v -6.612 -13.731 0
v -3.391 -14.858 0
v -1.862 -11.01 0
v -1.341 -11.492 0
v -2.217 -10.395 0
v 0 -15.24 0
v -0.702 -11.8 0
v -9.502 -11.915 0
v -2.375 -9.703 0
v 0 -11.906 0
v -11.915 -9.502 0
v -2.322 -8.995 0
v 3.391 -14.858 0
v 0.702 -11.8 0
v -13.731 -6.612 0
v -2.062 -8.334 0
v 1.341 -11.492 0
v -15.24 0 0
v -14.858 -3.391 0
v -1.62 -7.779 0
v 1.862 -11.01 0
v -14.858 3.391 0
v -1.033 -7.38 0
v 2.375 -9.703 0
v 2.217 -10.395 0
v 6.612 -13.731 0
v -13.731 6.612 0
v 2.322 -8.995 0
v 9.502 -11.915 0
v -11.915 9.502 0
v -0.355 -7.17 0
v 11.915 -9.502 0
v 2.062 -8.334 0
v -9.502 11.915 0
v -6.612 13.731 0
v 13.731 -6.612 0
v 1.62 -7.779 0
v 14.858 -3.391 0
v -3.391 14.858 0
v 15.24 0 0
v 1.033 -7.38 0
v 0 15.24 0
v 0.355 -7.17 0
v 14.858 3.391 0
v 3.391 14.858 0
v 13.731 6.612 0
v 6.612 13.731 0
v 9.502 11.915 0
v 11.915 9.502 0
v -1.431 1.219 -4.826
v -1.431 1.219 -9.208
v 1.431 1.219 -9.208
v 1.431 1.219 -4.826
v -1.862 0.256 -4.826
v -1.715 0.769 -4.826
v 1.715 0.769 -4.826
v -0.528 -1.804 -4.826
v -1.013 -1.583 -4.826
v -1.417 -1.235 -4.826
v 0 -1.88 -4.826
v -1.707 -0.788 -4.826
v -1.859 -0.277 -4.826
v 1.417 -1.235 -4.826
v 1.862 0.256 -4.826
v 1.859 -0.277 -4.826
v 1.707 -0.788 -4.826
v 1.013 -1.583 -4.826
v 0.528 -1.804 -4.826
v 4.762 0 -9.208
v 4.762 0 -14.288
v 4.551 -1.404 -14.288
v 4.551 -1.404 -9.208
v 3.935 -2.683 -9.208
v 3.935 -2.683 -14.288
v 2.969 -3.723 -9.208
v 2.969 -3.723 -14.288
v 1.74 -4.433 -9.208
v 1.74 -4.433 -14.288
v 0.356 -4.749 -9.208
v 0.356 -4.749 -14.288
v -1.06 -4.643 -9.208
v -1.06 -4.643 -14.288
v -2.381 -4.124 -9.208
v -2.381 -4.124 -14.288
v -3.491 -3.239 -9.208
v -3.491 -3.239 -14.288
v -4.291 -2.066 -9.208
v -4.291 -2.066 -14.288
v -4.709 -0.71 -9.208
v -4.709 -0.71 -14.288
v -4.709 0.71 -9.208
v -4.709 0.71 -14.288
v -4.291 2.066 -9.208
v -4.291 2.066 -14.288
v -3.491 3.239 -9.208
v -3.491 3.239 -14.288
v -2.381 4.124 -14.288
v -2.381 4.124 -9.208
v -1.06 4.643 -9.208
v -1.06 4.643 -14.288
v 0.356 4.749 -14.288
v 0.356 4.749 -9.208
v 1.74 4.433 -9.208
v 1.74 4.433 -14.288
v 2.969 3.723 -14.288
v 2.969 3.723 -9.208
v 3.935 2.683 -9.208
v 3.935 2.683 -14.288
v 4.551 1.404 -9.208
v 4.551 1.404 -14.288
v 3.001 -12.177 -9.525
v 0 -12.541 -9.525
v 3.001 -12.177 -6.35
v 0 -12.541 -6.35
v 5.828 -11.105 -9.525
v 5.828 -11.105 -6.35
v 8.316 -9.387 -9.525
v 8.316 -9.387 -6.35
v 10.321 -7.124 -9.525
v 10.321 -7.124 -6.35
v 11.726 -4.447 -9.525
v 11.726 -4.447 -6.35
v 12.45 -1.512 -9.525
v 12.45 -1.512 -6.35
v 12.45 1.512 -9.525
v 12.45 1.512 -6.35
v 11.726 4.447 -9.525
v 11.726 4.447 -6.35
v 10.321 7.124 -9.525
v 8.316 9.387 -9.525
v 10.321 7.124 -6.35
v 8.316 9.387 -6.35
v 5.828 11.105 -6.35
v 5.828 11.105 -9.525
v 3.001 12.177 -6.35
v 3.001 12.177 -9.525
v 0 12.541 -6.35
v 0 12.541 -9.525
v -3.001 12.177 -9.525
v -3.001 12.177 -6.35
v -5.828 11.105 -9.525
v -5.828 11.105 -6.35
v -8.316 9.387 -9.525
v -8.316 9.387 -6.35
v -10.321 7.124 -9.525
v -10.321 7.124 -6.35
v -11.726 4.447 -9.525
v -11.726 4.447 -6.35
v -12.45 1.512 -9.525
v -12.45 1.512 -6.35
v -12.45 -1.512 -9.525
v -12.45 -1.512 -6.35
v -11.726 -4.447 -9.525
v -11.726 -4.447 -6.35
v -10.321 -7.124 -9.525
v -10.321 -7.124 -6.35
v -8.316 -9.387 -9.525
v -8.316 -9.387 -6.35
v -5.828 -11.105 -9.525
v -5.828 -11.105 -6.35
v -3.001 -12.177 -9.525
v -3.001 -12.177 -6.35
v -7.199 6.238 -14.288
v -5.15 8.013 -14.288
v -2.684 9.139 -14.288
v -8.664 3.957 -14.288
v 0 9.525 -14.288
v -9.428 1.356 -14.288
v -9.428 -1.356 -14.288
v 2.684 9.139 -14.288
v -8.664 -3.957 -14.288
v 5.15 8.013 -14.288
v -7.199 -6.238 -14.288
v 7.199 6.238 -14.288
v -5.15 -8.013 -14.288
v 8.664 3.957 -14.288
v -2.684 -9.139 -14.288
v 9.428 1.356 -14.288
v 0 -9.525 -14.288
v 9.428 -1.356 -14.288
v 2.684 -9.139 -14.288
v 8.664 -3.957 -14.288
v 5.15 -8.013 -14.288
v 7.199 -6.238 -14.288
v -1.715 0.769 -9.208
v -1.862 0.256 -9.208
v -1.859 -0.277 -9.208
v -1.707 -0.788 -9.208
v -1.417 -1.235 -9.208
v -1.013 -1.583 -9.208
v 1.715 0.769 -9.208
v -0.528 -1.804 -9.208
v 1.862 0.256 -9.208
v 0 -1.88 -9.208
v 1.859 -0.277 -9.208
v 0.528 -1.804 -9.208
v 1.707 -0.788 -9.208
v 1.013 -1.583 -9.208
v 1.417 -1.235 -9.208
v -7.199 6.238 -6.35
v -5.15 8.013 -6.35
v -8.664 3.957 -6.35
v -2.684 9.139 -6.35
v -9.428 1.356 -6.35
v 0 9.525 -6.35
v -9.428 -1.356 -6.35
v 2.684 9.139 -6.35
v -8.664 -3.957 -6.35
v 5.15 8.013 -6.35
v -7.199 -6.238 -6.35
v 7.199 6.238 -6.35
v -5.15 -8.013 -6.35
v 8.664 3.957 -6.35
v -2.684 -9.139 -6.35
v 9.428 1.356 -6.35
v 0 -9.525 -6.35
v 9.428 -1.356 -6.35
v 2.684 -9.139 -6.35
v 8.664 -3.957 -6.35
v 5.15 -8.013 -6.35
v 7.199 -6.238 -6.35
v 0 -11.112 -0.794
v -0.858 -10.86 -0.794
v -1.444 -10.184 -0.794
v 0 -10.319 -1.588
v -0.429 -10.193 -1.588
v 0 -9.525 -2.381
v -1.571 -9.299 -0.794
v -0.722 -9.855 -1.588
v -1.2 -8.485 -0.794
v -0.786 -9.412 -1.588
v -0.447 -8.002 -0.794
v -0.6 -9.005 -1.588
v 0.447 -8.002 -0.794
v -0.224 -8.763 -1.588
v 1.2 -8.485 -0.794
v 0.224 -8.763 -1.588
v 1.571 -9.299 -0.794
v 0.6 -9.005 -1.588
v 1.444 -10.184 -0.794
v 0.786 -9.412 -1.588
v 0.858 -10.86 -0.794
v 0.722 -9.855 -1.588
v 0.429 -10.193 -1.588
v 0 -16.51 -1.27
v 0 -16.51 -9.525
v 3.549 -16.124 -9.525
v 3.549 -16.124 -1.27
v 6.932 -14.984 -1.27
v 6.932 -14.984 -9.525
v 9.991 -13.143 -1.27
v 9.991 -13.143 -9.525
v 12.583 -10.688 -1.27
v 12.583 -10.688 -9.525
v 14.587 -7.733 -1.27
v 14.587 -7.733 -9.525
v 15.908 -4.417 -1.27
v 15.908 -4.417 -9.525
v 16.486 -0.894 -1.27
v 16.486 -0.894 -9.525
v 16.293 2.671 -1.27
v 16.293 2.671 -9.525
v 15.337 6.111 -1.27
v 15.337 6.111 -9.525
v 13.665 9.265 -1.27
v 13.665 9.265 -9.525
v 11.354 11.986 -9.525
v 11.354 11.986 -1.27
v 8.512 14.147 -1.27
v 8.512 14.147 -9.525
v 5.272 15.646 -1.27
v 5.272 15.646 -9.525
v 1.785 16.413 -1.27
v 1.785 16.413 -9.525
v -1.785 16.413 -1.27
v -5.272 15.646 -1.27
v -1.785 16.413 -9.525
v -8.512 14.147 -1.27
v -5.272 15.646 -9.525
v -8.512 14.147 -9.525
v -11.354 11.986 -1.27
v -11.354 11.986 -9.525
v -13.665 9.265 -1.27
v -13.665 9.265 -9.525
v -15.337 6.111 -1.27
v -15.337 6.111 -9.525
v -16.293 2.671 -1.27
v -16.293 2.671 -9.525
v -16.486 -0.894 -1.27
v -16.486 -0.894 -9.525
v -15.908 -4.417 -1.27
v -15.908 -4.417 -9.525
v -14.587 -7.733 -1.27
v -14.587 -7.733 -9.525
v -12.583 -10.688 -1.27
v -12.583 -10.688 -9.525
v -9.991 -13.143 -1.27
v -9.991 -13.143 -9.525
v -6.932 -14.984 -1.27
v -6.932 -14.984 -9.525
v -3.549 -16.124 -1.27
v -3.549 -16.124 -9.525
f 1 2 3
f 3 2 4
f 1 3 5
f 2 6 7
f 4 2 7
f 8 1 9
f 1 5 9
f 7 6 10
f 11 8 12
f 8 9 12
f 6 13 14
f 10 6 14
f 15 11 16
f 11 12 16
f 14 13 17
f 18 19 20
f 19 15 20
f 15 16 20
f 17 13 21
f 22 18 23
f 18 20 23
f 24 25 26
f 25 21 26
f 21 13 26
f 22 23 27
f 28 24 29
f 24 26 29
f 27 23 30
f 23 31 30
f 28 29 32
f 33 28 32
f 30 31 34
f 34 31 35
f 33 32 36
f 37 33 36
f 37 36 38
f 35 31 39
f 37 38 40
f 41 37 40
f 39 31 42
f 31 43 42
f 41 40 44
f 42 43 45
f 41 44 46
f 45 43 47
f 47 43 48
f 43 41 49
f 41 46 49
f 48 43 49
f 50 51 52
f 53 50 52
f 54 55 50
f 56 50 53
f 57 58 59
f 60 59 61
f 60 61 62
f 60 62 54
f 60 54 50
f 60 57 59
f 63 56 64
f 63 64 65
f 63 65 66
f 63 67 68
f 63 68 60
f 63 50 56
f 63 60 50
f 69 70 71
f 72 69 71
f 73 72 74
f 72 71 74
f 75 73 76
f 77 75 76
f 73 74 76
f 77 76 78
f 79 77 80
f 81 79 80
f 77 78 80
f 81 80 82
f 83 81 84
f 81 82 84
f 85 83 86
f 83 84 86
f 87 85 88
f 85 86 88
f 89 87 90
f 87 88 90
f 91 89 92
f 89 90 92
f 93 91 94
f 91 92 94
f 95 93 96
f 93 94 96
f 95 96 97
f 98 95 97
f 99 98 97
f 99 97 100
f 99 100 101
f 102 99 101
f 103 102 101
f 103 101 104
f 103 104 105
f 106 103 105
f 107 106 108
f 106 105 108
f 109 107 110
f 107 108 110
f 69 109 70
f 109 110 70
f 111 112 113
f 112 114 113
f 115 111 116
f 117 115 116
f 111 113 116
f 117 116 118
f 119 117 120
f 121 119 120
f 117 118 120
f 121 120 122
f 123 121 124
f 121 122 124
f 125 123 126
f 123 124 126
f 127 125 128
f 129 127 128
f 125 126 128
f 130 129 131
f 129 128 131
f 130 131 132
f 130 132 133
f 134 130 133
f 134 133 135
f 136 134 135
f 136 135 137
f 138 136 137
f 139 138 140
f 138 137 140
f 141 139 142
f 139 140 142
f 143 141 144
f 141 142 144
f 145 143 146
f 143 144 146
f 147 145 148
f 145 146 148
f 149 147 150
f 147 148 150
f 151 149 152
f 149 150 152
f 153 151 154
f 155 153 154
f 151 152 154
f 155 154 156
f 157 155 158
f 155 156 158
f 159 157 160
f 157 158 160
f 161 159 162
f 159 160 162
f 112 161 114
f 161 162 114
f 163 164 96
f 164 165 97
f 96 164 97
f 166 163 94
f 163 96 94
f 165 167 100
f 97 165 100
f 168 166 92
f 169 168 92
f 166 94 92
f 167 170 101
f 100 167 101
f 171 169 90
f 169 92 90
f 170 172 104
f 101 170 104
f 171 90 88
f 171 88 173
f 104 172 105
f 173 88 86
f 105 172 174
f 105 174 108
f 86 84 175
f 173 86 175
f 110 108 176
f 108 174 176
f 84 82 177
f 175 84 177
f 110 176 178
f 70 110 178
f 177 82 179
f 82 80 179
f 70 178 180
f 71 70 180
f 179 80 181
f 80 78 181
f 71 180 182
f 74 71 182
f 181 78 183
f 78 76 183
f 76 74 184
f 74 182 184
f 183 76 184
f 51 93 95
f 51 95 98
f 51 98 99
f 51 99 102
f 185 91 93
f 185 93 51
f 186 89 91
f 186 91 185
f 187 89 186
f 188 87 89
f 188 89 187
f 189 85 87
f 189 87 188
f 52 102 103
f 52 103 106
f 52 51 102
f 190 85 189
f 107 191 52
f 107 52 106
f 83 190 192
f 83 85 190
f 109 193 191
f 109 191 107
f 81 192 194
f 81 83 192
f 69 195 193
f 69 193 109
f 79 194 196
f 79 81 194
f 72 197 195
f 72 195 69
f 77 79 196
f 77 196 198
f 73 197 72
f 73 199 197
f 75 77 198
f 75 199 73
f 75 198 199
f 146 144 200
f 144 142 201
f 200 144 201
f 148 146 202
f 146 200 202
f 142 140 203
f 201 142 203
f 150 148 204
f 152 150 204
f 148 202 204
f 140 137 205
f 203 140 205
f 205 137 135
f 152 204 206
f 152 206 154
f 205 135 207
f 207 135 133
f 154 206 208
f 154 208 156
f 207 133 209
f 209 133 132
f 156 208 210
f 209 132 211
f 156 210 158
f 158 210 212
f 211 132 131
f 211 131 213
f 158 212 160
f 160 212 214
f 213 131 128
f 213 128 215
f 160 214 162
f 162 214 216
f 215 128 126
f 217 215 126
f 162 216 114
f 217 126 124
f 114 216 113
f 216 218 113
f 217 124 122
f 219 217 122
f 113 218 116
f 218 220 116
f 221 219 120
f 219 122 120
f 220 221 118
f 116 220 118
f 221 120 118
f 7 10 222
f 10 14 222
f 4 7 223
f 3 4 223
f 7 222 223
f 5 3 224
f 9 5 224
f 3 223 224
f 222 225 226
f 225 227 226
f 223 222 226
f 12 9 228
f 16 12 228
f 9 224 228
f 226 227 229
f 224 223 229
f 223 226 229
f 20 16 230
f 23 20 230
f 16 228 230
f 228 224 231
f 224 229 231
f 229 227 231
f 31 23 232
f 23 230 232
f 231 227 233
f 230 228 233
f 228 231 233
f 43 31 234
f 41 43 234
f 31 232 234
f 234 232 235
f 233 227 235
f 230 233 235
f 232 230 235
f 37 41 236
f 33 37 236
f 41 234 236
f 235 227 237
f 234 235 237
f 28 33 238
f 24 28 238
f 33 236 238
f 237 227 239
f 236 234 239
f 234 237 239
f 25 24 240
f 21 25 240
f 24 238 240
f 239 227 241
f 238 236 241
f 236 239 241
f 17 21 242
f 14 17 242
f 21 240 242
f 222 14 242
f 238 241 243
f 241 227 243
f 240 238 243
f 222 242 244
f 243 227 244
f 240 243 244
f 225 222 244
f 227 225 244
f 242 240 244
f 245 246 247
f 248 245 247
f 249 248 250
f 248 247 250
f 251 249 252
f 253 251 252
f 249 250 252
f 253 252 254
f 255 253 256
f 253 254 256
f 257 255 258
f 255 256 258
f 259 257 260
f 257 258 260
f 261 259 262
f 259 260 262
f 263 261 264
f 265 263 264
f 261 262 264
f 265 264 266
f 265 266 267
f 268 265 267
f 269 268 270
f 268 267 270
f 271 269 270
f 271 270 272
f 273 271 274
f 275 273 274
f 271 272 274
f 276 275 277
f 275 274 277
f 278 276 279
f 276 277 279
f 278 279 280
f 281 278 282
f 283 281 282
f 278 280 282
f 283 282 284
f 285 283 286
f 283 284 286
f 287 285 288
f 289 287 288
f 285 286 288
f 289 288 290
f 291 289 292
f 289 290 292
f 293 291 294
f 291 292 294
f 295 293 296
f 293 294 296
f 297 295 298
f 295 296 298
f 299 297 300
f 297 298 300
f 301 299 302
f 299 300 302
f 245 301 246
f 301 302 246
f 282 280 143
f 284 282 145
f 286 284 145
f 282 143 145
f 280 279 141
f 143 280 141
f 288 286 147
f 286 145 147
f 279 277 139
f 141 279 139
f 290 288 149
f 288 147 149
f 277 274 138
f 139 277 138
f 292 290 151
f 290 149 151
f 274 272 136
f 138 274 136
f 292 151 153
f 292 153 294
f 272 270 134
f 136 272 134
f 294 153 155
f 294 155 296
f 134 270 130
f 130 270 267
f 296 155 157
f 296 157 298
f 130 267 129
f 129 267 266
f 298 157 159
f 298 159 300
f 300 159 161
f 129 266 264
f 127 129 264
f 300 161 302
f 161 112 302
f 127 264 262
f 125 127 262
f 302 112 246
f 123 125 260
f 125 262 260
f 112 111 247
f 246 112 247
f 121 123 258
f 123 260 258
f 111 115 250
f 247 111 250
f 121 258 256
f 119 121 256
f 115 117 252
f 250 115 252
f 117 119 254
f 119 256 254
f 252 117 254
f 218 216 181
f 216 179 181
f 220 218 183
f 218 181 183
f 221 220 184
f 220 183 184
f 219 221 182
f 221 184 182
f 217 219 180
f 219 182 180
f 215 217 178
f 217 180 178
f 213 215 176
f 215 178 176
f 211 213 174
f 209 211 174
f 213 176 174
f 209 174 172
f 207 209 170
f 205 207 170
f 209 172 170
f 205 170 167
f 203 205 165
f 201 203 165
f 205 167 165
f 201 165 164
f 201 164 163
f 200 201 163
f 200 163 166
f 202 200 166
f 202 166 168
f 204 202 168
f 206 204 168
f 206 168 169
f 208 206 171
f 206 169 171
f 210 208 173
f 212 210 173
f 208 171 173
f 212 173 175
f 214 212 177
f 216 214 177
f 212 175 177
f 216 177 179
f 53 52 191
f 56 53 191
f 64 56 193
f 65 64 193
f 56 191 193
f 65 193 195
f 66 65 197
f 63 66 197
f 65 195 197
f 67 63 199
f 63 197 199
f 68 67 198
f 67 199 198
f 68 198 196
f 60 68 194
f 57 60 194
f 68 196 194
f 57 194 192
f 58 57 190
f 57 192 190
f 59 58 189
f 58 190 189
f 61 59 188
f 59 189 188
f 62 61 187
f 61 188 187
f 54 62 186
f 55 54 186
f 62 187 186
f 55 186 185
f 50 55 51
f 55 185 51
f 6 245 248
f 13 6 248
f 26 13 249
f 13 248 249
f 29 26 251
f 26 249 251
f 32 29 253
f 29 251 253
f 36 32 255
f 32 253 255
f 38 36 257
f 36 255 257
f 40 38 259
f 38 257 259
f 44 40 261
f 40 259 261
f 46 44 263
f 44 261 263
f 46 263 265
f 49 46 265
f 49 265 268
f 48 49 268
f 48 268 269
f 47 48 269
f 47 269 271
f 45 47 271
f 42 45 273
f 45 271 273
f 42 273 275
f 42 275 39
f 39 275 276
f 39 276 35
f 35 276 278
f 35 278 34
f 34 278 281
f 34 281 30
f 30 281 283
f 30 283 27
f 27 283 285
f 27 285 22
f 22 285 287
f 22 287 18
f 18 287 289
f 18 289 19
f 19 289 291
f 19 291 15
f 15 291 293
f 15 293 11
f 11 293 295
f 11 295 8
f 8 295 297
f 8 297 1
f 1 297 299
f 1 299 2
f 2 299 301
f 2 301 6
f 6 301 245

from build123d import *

# Parameters (mm, degrees)
F3_DEPTH  = 9.4615
F6_SIZE   = 1.27
F7_R      = 4.7625
F8_DEPTH  = 5.08
F10_DEPTH = 4.3815


with BuildPart() as f1:
    # F0 (on Right) → F1 (revolve)
    with BuildSketch(Plane.YZ):
        Polygon((0, -14.2875), (0, 0), (-16.51, 0), (-16.51, -9.525), (-12.54125, -9.525), (-12.54125, -6.35), (-9.525, -6.35), (-9.525, -14.2875), align=None)
    revolve(axis=Axis((0, 0, -7.14375), (0, 0, 1)))

    # F2 (on face) → F3 (cut)
    with BuildSketch(Plane(origin=(0, 0, -14.2875), x_dir=(1, 0, 0), z_dir=(0, 0, -1))):
        with BuildLine():
            Line((-1.39492, -1.143), (1.39492, -1.143))
            ThreePointArc((1.39492, -1.143), (0, 1.8034), (-1.39492, -1.143))
        make_face()
    extrude(amount=-F3_DEPTH, mode=Mode.SUBTRACT)

    # F4 (on Right) → F5 (revolve, cut)
    with BuildSketch(Plane.YZ):
        Polygon((-9.525, 0), (-11.90625, 0), (-9.525, -2.38125), align=None)
    revolve(axis=Axis((0, -9.525, -1.190625), (0, 0, -1)), mode=Mode.SUBTRACT)

    # F6
    f6_edges = [f1.edges().sort_by_distance(p)[0] for p in [
        (0, 16.51, 0),
    ]]
    chamfer(f6_edges, length=F6_SIZE)

    # F7 (on face) → F8 (cut)
    with BuildSketch(Plane(origin=(0, 0, -14.2875), x_dir=(1, 0, 0), z_dir=(0, 0, -1))):
        Circle(F7_R)
    extrude(amount=-F8_DEPTH, mode=Mode.SUBTRACT)

    # F9 (on face) → F10 (cut, through all)
    with BuildSketch(Plane(origin=(0, 0, -9.2075), x_dir=(1, 0, 0), z_dir=(0, 0, -1))):
        with BuildLine():
            Line((-1.430541, -1.2192), (1.430541, -1.2192))
            ThreePointArc((1.430541, -1.2192), (0, 1.8796), (-1.430541, -1.2192))
        make_face()
    extrude(amount=-F10_DEPTH, mode=Mode.SUBTRACT)


solid = f1.part
